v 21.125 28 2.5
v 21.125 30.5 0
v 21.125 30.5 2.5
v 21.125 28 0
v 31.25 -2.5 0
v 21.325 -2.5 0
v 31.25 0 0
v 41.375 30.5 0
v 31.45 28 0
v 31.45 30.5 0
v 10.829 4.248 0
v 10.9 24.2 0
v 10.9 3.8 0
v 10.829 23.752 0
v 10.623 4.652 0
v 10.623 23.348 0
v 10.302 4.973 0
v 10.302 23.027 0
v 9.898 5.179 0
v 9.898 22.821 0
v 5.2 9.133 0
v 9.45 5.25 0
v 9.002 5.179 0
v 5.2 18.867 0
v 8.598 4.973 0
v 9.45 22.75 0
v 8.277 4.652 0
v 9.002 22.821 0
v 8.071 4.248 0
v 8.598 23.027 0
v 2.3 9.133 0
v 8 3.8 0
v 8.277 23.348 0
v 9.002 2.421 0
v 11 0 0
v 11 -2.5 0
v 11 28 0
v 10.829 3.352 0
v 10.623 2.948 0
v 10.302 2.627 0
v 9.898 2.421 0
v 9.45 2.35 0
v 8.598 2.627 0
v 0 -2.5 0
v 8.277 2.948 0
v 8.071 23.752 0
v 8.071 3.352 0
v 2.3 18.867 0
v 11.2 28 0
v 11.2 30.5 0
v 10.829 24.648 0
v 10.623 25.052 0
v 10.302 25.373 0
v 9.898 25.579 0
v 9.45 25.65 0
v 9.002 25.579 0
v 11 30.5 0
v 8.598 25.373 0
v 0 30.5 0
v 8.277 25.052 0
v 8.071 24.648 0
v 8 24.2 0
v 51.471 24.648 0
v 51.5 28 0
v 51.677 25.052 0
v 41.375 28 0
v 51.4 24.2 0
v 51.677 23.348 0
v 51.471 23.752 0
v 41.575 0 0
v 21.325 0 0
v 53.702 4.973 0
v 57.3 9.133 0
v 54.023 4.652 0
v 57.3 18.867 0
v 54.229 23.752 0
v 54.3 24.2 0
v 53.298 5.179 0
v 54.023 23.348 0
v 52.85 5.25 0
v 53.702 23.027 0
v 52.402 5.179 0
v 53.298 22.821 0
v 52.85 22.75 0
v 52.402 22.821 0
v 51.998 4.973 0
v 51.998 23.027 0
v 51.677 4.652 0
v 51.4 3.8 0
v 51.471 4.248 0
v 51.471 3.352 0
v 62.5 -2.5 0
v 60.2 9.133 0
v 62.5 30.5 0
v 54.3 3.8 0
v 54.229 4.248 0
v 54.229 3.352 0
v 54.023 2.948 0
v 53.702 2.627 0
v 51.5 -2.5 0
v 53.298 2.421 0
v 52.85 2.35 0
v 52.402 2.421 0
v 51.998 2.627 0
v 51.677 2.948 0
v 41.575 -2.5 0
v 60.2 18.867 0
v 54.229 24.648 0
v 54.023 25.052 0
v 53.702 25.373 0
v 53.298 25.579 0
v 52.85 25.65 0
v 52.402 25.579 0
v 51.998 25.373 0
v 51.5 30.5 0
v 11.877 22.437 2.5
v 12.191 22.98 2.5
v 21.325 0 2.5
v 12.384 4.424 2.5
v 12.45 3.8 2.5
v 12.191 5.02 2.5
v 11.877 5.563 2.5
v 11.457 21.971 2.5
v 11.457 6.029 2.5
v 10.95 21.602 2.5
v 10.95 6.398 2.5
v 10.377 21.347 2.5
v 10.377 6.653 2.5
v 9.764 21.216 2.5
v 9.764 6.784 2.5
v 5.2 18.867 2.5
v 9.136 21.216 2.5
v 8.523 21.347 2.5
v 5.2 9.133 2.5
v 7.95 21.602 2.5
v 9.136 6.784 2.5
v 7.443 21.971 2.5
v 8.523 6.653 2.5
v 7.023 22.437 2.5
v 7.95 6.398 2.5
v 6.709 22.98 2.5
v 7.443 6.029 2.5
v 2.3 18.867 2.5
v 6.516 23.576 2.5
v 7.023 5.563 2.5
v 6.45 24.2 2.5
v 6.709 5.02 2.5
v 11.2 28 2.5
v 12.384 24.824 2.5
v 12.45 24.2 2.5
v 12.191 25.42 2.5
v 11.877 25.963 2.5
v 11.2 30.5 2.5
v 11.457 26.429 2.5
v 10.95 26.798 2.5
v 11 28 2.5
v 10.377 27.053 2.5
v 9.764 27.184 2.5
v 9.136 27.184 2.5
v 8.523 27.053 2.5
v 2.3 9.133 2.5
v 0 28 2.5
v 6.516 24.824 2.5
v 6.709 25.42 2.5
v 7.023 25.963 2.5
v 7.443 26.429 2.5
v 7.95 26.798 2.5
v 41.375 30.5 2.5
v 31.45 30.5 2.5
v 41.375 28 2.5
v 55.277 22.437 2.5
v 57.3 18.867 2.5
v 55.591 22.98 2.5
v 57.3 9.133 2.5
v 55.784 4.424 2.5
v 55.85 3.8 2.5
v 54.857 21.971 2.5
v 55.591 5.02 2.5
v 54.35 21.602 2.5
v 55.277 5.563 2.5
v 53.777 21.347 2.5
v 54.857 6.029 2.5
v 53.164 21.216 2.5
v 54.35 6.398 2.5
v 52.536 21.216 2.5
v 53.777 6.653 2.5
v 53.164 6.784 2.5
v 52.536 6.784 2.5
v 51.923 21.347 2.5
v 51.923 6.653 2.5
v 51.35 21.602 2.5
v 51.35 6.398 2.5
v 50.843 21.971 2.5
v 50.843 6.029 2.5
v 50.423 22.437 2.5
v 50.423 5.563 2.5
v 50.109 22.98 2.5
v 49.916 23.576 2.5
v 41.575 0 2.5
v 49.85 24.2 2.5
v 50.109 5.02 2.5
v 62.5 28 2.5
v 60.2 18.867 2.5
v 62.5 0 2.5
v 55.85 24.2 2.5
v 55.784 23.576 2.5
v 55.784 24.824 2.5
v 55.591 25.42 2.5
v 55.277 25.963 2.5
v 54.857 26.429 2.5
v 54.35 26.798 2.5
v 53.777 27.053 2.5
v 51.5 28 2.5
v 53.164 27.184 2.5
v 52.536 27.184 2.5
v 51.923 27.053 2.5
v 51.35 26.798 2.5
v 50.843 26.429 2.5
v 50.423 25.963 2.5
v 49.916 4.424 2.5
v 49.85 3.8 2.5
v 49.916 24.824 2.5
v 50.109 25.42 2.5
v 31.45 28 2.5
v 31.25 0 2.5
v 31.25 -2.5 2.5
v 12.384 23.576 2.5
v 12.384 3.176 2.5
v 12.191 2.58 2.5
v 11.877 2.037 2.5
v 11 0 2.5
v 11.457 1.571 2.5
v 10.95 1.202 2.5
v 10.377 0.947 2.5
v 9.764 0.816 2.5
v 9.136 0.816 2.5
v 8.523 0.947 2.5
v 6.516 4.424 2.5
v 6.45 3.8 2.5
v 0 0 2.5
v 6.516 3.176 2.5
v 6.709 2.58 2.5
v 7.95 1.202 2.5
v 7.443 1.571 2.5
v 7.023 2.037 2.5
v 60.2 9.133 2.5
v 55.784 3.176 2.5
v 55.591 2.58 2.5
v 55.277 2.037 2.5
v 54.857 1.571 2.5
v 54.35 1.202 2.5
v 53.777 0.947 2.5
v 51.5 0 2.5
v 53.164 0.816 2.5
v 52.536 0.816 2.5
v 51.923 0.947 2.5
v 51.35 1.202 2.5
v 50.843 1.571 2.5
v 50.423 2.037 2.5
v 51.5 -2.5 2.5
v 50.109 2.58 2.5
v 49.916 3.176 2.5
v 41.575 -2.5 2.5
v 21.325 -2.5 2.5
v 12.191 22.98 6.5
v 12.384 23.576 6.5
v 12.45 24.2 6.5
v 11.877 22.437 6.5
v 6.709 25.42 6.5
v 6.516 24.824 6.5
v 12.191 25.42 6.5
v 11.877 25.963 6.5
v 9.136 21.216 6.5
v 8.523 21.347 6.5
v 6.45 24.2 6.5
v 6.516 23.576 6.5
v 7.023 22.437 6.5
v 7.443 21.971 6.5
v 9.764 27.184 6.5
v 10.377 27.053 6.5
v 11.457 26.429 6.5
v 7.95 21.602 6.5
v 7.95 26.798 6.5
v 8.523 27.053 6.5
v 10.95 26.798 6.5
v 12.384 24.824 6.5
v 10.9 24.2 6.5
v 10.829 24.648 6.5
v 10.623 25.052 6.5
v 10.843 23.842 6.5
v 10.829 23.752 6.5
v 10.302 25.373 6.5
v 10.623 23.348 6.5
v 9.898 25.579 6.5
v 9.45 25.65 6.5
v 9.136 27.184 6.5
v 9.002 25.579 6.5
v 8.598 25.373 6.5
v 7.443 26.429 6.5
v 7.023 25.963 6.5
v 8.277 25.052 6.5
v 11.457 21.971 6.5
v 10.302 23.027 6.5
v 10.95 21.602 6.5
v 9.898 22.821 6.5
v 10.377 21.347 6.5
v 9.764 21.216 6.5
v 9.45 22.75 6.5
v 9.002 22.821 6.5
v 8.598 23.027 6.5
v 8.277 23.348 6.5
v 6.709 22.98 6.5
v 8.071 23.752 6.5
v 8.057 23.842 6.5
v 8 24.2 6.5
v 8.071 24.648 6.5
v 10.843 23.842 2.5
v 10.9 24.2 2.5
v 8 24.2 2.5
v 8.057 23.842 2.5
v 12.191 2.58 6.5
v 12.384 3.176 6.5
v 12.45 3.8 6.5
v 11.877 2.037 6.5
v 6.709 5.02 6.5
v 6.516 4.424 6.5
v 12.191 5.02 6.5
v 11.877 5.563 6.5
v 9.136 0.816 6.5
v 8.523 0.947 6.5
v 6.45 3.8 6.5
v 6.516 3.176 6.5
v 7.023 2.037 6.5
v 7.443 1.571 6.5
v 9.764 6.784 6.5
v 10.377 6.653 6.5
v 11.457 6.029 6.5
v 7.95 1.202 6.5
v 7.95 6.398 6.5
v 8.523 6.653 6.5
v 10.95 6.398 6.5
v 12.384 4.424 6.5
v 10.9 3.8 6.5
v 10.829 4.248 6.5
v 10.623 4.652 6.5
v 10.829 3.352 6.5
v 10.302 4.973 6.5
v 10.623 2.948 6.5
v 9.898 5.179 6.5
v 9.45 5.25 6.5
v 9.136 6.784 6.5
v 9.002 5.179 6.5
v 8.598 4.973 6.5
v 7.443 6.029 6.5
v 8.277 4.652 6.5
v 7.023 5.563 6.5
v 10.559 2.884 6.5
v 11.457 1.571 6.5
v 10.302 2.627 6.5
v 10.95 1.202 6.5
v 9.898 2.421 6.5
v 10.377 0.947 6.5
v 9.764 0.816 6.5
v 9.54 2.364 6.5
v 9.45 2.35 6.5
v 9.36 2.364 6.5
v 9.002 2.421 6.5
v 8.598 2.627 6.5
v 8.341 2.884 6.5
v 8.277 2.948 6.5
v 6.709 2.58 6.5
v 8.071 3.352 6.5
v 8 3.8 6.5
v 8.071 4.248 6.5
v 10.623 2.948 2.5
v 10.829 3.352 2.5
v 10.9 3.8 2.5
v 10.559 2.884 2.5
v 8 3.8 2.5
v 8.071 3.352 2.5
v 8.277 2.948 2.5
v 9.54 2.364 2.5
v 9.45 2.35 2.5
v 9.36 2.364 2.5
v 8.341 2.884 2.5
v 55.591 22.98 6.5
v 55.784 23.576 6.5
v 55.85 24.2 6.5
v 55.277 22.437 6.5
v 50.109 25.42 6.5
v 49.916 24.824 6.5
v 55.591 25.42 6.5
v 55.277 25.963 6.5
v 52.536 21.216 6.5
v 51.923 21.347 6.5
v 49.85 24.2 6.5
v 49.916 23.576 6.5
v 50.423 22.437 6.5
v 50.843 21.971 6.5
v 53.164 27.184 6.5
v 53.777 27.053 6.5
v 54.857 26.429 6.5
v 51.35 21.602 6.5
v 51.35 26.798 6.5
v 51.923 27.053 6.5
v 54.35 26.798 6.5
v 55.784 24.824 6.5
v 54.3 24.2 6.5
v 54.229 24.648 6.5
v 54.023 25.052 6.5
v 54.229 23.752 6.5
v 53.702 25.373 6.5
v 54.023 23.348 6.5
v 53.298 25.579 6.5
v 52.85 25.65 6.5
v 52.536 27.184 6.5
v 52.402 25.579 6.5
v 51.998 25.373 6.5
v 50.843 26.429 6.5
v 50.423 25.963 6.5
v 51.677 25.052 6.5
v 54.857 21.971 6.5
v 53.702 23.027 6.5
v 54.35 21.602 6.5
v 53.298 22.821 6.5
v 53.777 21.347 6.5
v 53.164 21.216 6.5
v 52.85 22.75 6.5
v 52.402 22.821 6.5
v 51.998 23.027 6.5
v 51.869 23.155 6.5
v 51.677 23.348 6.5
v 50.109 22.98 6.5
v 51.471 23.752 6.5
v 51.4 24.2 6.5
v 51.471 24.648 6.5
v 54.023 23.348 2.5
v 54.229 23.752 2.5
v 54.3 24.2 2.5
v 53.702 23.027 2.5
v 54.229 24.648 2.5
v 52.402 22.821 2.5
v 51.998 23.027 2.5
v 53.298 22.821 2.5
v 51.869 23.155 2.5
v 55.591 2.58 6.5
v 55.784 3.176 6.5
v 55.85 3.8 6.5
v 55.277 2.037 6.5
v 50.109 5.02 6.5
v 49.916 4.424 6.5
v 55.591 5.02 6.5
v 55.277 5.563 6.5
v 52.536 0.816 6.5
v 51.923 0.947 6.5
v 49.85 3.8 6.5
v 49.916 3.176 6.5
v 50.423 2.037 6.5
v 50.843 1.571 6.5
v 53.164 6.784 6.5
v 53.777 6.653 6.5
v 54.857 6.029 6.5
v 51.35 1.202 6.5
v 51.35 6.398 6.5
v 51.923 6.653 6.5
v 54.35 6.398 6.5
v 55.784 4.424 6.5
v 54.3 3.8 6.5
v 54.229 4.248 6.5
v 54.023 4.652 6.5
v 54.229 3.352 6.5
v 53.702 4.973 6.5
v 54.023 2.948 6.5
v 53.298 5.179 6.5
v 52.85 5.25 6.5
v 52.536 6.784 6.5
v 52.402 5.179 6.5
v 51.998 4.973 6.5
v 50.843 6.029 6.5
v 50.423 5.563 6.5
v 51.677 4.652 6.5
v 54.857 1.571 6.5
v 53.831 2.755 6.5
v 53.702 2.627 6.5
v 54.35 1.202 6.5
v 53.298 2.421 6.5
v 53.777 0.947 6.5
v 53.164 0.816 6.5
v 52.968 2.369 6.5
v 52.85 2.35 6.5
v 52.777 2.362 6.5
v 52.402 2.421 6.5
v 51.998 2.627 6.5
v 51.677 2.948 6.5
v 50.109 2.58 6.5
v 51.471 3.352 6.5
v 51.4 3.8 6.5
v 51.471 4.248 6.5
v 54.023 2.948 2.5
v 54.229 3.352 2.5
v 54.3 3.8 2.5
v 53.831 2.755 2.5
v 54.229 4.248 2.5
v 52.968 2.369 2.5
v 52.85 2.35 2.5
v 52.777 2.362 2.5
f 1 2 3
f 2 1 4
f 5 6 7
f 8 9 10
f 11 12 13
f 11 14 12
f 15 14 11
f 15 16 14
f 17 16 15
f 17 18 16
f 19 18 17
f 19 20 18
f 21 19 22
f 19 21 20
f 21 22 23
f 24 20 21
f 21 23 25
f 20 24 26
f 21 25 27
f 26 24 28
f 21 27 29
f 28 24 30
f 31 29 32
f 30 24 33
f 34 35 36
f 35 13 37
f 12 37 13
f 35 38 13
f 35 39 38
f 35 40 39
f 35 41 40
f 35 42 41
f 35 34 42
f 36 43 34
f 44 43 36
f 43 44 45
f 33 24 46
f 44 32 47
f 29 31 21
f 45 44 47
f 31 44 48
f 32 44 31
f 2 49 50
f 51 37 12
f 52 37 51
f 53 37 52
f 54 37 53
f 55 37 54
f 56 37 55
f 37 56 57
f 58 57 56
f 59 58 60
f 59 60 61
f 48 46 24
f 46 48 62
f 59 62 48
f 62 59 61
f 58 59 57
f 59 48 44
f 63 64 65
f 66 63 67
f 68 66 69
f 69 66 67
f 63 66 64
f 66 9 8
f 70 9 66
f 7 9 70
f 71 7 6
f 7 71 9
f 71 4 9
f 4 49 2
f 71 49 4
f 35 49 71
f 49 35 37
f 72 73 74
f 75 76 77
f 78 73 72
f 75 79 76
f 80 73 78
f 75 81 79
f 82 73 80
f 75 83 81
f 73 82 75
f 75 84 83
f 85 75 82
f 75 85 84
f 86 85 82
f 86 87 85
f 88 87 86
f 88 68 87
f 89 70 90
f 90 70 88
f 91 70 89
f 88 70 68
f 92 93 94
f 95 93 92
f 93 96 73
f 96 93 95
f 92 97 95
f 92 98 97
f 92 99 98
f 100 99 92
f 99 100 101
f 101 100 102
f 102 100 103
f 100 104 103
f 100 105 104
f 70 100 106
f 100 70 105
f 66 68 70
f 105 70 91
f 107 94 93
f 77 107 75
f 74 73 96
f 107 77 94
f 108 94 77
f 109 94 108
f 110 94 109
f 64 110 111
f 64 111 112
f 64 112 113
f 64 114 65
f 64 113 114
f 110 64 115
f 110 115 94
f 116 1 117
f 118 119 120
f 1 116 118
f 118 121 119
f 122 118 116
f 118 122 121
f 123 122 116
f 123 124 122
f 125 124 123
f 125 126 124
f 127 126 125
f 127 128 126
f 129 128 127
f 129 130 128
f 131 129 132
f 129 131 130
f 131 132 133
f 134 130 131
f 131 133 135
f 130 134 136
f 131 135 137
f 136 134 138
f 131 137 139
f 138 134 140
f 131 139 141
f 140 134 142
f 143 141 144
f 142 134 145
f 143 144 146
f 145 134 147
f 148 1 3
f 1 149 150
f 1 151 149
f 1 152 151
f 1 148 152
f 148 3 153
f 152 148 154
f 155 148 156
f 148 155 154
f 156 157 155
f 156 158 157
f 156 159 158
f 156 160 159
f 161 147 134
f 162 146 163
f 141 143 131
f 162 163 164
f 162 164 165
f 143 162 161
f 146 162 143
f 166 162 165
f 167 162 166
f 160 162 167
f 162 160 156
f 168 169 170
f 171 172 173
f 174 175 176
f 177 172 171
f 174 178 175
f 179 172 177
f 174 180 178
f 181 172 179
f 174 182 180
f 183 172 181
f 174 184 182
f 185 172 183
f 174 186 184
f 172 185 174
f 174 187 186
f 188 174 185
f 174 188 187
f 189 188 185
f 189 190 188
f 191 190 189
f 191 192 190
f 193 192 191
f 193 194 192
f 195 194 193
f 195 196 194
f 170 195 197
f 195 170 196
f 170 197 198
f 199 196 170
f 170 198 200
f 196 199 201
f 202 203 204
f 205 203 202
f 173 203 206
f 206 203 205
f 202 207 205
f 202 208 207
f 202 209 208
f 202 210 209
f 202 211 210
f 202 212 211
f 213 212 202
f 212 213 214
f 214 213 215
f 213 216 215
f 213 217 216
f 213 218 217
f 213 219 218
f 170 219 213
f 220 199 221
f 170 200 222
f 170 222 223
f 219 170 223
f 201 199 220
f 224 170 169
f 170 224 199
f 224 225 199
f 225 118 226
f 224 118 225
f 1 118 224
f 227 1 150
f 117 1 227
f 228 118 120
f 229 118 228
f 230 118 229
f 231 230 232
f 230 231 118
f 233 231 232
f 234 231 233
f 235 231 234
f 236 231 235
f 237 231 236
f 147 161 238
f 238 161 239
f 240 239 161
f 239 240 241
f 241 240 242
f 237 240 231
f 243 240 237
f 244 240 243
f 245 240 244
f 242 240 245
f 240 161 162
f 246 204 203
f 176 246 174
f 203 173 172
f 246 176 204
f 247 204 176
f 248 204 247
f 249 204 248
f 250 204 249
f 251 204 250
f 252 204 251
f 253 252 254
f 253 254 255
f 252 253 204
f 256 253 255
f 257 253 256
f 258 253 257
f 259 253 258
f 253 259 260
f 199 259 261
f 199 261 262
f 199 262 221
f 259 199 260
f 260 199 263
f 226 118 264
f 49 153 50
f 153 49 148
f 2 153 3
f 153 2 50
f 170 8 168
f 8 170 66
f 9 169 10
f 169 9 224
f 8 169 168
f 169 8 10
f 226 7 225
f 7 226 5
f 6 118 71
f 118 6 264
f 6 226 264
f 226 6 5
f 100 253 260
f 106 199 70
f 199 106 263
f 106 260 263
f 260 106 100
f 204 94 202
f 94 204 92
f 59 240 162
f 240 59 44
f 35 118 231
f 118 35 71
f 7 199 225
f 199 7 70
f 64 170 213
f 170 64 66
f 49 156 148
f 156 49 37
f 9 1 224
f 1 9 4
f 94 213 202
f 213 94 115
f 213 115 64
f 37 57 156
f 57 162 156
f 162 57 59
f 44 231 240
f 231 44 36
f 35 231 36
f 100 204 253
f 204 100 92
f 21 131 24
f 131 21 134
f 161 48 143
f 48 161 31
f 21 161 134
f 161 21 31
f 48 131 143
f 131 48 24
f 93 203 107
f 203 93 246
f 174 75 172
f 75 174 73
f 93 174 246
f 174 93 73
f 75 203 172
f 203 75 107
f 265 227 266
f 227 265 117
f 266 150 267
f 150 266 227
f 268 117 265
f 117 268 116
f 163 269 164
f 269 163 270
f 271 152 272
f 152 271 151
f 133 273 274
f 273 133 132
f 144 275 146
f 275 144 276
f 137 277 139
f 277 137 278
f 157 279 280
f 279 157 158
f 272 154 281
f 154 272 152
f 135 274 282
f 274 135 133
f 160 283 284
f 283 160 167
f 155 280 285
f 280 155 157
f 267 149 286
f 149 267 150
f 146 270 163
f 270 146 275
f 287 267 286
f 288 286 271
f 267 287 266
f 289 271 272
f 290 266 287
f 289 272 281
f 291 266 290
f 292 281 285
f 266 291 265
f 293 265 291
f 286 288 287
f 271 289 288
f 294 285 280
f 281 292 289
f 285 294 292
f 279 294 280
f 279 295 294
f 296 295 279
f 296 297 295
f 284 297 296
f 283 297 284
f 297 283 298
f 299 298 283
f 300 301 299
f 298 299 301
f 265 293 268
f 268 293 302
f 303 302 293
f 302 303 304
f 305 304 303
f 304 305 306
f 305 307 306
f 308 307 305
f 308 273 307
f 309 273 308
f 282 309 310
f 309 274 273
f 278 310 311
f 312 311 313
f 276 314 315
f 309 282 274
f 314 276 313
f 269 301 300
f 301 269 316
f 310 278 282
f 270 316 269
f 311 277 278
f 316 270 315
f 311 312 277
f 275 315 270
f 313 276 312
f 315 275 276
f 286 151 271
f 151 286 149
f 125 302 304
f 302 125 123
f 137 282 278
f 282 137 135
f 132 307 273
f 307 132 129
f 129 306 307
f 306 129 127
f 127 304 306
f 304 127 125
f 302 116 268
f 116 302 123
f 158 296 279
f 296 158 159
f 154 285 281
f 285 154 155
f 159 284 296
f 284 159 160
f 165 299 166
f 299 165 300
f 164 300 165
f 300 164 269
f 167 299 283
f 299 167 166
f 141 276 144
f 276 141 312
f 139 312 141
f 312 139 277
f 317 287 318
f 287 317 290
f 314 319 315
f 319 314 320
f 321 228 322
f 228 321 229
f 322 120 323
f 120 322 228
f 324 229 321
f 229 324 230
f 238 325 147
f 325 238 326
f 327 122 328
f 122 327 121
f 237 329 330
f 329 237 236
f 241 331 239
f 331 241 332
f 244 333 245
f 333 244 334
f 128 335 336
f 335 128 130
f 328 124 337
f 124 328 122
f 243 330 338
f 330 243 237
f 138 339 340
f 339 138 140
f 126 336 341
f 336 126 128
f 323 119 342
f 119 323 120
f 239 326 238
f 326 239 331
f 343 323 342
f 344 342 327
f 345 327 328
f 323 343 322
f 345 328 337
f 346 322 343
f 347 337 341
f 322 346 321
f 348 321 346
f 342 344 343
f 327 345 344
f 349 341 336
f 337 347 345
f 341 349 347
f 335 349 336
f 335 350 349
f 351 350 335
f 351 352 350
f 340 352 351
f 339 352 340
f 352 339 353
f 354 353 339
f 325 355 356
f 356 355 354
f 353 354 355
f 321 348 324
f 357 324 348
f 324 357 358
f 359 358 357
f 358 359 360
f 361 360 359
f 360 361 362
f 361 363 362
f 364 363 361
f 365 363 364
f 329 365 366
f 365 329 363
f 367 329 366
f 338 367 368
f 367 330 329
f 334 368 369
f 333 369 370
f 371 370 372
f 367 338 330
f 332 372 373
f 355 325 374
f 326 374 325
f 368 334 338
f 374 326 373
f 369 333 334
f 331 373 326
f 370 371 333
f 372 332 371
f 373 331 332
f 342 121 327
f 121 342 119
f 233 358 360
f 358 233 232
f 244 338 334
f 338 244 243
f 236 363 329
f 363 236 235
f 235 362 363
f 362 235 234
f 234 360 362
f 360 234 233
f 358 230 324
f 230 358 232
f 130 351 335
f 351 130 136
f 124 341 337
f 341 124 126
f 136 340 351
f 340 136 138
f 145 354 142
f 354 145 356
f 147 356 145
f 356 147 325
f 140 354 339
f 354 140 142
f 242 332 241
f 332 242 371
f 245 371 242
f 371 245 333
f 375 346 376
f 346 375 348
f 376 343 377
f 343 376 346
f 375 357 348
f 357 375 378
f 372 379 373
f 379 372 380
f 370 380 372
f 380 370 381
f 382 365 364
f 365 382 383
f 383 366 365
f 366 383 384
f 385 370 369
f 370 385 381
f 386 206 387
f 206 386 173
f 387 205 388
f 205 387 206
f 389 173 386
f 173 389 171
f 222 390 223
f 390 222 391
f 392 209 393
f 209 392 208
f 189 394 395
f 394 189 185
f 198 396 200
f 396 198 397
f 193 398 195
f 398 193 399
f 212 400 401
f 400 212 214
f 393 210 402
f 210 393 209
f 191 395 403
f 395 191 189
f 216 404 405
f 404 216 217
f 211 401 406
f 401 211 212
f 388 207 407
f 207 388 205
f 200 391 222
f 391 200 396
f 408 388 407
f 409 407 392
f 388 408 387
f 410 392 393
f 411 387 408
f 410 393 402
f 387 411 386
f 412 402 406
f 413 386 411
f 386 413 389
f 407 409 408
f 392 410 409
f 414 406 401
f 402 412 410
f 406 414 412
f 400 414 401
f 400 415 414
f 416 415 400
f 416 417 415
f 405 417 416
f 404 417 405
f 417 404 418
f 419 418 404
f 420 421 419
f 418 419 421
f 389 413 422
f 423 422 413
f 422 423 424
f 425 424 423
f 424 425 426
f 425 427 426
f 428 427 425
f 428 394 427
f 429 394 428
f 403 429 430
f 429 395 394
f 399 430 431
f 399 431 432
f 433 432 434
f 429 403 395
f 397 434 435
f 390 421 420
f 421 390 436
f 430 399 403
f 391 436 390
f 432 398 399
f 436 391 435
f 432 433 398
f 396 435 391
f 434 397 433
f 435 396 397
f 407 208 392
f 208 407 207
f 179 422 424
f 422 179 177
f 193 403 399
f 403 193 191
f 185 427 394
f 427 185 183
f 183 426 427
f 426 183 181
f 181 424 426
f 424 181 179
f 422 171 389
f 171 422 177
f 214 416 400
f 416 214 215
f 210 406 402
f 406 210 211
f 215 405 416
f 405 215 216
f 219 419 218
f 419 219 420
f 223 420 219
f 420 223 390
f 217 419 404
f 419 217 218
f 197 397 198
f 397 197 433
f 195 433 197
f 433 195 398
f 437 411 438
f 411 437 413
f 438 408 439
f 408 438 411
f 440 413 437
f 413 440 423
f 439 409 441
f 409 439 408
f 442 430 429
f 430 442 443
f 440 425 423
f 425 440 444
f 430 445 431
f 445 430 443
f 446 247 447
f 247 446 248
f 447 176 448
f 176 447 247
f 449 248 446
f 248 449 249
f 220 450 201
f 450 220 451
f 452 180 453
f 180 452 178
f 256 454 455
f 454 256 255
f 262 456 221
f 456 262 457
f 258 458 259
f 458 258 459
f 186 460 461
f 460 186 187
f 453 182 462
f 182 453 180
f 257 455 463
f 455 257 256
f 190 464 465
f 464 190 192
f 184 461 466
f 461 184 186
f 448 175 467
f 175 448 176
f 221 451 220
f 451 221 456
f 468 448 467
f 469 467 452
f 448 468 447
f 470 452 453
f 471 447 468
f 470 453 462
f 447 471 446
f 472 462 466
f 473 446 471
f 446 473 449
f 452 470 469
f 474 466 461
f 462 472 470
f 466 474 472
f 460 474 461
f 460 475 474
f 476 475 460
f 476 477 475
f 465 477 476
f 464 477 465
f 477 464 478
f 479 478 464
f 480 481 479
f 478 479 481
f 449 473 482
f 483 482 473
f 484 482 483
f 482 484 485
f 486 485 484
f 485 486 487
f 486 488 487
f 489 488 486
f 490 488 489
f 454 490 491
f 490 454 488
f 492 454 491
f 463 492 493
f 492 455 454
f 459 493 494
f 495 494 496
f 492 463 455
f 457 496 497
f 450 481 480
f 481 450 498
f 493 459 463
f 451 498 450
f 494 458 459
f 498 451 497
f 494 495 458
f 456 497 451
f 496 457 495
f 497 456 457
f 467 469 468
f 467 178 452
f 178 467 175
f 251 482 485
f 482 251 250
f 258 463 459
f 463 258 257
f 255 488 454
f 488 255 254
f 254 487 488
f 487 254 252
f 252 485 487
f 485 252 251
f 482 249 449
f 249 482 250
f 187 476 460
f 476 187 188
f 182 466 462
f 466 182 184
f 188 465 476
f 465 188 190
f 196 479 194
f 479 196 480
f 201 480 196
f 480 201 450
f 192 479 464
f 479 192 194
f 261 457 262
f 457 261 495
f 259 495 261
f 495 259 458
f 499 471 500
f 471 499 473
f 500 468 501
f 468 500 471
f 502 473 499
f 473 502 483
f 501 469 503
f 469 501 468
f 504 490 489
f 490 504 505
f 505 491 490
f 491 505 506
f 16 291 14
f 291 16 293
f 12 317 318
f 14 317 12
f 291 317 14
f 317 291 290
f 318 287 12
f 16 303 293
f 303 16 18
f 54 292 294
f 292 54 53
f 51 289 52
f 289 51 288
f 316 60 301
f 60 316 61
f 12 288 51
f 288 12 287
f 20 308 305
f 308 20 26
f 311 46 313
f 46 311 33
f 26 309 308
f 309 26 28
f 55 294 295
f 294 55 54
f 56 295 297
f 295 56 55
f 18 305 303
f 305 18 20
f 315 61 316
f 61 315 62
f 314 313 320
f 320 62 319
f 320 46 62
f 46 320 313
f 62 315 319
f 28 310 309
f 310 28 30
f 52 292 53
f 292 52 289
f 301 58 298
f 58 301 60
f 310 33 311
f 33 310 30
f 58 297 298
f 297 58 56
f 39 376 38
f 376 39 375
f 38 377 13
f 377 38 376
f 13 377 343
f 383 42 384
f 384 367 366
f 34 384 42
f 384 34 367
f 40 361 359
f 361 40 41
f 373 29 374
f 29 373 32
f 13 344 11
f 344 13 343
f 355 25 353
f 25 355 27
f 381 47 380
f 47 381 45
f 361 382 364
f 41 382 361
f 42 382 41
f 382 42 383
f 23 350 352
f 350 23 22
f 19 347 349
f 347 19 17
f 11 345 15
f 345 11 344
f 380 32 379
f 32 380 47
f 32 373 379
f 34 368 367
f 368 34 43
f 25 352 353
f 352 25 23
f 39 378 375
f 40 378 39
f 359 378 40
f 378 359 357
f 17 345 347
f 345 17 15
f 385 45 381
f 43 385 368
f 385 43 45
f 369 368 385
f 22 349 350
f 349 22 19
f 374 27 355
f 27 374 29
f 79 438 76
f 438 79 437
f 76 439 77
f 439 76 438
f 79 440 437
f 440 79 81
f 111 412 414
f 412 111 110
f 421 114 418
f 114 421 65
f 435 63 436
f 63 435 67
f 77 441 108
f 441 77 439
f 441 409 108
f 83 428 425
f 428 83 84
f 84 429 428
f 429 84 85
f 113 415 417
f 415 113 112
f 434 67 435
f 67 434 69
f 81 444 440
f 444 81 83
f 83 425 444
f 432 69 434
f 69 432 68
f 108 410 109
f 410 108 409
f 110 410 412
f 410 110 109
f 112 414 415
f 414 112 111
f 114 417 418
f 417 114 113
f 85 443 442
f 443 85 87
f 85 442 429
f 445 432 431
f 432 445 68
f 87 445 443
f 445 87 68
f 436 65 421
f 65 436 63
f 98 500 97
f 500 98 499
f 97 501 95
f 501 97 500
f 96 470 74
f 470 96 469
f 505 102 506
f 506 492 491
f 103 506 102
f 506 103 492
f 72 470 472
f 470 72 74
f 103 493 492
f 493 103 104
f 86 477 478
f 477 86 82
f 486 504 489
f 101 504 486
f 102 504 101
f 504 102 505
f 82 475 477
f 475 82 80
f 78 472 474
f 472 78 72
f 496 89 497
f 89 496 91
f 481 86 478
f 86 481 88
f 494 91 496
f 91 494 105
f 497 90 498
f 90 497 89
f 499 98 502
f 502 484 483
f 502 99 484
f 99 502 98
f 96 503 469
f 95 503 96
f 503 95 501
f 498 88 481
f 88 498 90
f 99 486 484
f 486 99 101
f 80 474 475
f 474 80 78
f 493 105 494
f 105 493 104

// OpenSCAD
/*
// dgazineu@gmail.com (Douglas Gazineu)
// Rev1: 2016-08-18 :: Initial Release
// Rev2: 2016-08-20 :: Removed Ring Shrinkage
// Rev3: 2016-08-22 :: Screw Holes option for Ring Lock, Internal Depth Correction
// Rev4: 2016-08-23 :: Internal support feet for boards, changed default walls orientation for printing it
// Rev5: 2016-08-24 :: Vents Option
// Rev6: 2016-12-02 :: Fix: Generate multiple parts at once
//
*/

// Part to be viewed
part = "bottom"; // [top:Top, bottom:Bottom, side:Sides, face: Front/Back, lock: Lock parts, all: Assembled View, exploded: Exploded View ]

/* [General Options] */
// Type of Lock
Lock_Type=2; //[1:Corners, 2:Rings]
// Reinforce Rings and provide screw hole
Ring_Screw_Holes = 1; //[0:No, 1:Yes]
// Internal Feet for boards 
Internal_Feet = 1; //[0:No, 1:Yes]
// Ventilation Openings 
Side_Vents = 1; //[0:No, 1:Yes]
Top_Vents = 1; //[0:No, 1:Yes]

/* [Dimensions] */
//Dimensions (Internal).
depth=55;
height=57;
width=28;
//Length of Lock parts/ring.
Lock_Length=11; // [3:50]
//Thickness of Walls
Wall_Thickness=2.5; // [2,2.5,3,3.5,4,4.5,5,5.5,6,7,8]
// Diameter of screw holes in mm
Ring_Screw_Diameter = 2.9; //[1.5,2,2.2,2.5,3,3.5,4,4.5,5]

/* [Internal Support Feet] */
// Internal Feet Separation (between center of holes)
Feet_Depth=43.4;
Feet_Width=20.4;
// Distances are cleared from walls on the reference side
Feet_Distance_From_Back = 0;
Feet_Distance_From_Side = .8;
Feet_Screw_Pole_Height = 4; //[1:10]
Feet_Screw_Pole_Diameter = 6; //[4:15]
Feet_Screw_Diameter = 2.9; //[1.5,2,2.2,2.5,3,3.5,4,4.5,5]

/* [Vents Options] */
Vents_Number=5;
Vents_Distance=1.5;
// Each vent length relative to width or height of panel
Vents_Relation=4; // [3:10]

/* [Fine Adjustments] */
// Avg Interval between anchor points for faces
Anchor_Interval=35; // [20,25,30,35,40,50,60,70,80,90,100]
// Gap between fittings, so no sanding should be needed
Gap=0.4;




module prism(l, w, h) {
       polyhedron(points=[
               [0,0,h],           // 0    front top corner
               [0,0,0],[w,0,0],   // 1, 2 front left & right bottom corners
               [0,l,h],           // 3    back top corner
               [0,l,0],[w,l,0]    // 4, 5 back left & right bottom corners
       ], faces=[ // points for all faces must be ordered clockwise when looking in
               [0,2,1],    // top face
               [3,4,5],    // base face
               [0,1,4,3],  // h face
               [1,2,5,4],  // w face
               [0,3,5,2],  // hypotenuse face
       ]);
}

module side(depth,width){
    Side_depth=depth+3*Wall_Thickness;
    Border_Distance= 2*Wall_Thickness+Ring_Screw_Diameter/2;
    Vent_Length = (width-2*Wall_Thickness)/Vents_Relation;
    difference(){
        plate(depth,width);
        if (Ring_Screw_Holes == 1) {
            if (Lock_Type==2){
                translate([Border_Distance,width/2,Wall_Thickness]) cylinder($fn= 20, h = 4*Wall_Thickness, r = Ring_Screw_Diameter/2, center=true);
               translate([Side_depth-Border_Distance,width/2,Wall_Thickness]) cylinder($fn= 20, h = 4*Wall_Thickness, r = Ring_Screw_Diameter/2, center=true);
                }
            }
           if (Side_Vents == 1){
               for (a=[0:1:Vents_Number-1]){
               translate([Lock_Length+(2*a*Vents_Distance)+Vents_Distance,Wall_Thickness,-Wall_Thickness]) cube([Vents_Distance,Vent_Length,3*Wall_Thickness]);
               translate([Lock_Length+(2*a*Vents_Distance)+Vents_Distance,width-Vent_Length-Wall_Thickness,-Wall_Thickness]) cube([Vents_Distance,Vent_Length,3*Wall_Thickness]);
               translate([depth-(Lock_Length+(2*(a+1)*Vents_Distance)-3*Wall_Thickness),Wall_Thickness,-Wall_Thickness]) cube([Vents_Distance,Vent_Length,3*Wall_Thickness]);
                 translate([depth-(Lock_Length+(2*(a+1)*Vents_Distance)-3*Wall_Thickness),width-Vent_Length-Wall_Thickness,-Wall_Thickness]) cube([Vents_Distance,Vent_Length,3*Wall_Thickness]);
               }
           }
        }
}

module bottom(depth,width){
    Bottom_depth=depth+3*Wall_Thickness;
    difference(){
        union(){
            plate(depth,width);
            if (Internal_Feet == 1){
                if (Lock_Type==2){
                    for (x =[Feet_Distance_From_Back:Feet_Depth:Feet_Distance_From_Back+Feet_Depth]){
                        for (y = [Feet_Distance_From_Side:Feet_Width:Feet_Distance_From_Side+Feet_Width]){
                            translate([x+Feet_Screw_Pole_Diameter/2,y+Feet_Screw_Pole_Diameter/2,0]) ScrewPost();
                        }
                    }
                }
            }
        }
        if (Internal_Feet == 1){
            if (Lock_Type==2){
                for (x =[Feet_Distance_From_Back:Feet_Depth:Feet_Distance_From_Back+Feet_Depth]){
                    for (y = [Feet_Distance_From_Side:Feet_Width:Feet_Distance_From_Side+Feet_Width]){
                        translate([x+Feet_Screw_Pole_Diameter/2,y+Feet_Screw_Pole_Diameter/2,0]) ScrewHole();
                        }
                    }
                }
            }
}

module top(depth,width){
    Top_depth=depth+3*Wall_Thickness;
    Vent_Length = (width-2*Wall_Thickness)/Vents_Relation;
    difference(){
        plate(depth,width);
        if (Top_Vents == 1){
                for (a=[0:1:Vents_Number-1]){
             translate([Lock_Length+(2*a*Vents_Distance)+Vents_Distance,Wall_Thickness,-Wall_Thickness]) cube([Vents_Distance,Vent_Length,3*Wall_Thickness]);
              translate([Lock_Length+(2*a*Vents_Distance)+Vents_Distance,width-Vent_Length-Wall_Thickness,-Wall_Thickness]) cube([Vents_Distance,Vent_Length,3*Wall_Thickness]);
               translate([depth-(Lock_Length+(2*(a+1)*Vents_Distance)-3*Wall_Thickness),Wall_Thickness,-Wall_Thickness]) cube([Vents_Distance,Vent_Length,3*Wall_Thickness]);
                 translate([depth-(Lock_Length+(2*(a+1)*Vents_Distance)-3*Wall_Thickness),width-Vent_Length-Wall_Thickness,-Wall_Thickness]) cube([Vents_Distance,Vent_Length,3*Wall_Thickness]);
               }
        }
    }
}

module ScrewPost(){
    Border_Distance= 2*Wall_Thickness+Ring_Screw_Diameter/2;
    difference(){
           translate([Border_Distance,0,-(Feet_Screw_Pole_Height/2)+Wall_Thickness/2]) cylinder($fn= 30, h=Feet_Screw_Pole_Height+Wall_Thickness, r = Feet_Screw_Pole_Diameter/2, center=true);   
        translate([Border_Distance,0,-Wall_Thickness]) cylinder($fn= 20, h=Wall_Thickness+Feet_Screw_Pole_Height+2, r = Feet_Screw_Diameter/2, center=true);
        
    }

}
module ScrewHole(){
    Border_Distance= 2*Wall_Thickness+Ring_Screw_Diameter/2;
    translate([Border_Distance,0,0]) cylinder($fn= 20, h=Wall_Thickness+Feet_Screw_Pole_Height+2, r = Feet_Screw_Diameter/2, center=true);
        
    }

}

module plate(depth,width) {
    depth=depth+3*Wall_Thickness;
    tmpcols = width % Anchor_Interval;
    cols=(width - tmpcols) / Anchor_Interval;
    sizecols = width / (cols+1.5);
   
    remain = depth - (2*Lock_Length);
    tmprows = remain % Anchor_Interval;
    rows=(remain - tmprows) / Anchor_Interval;
    sizerows = remain / (rows+1);
    
   difference(){
        union() {
          cube([depth, width, Wall_Thickness]);
          translate([depth,0,Wall_Thickness])     rotate([0,0,90])   prism(Lock_Length,-Wall_Thickness,-Wall_Thickness);
          translate([Lock_Length,0,Wall_Thickness])   rotate([0,0,90])    prism(Lock_Length,-Wall_Thickness,-Wall_Thickness);
      if (Lock_Type == 1){
              difference(){
                 union(){      
                      translate([depth,Wall_Thickness,Wall_Thickness]) rotate([0,0,90]) prism(Lock_Length,-2*Wall_Thickness,Wall_Thickness);     
                      translate([Lock_Length,Wall_Thickness,Wall_Thickness]) rotate([0,0,90]) prism(Lock_Length,-2*Wall_Thickness,Wall_Thickness);
                 }
                 translate([0,-Wall_Thickness,1.5*Wall_Thickness])  cube([depth, 2*Wall_Thickness, 0.5*Wall_Thickness]);
              }
       }
          translate([0,width,Wall_Thickness])  rotate([0,0,270]) prism(Lock_Length,-Wall_Thickness,-Wall_Thickness);
          translate([depth-Lock_Length,width,Wall_Thickness])  rotate([0,0,270]) prism(Lock_Length,-Wall_Thickness,-Wall_Thickness);
          union(){
             for (a =[0:sizerows:depth-(sizerows+(2*Lock_Length))]) {
              translate([a+Lock_Length+(Gap/2),-Wall_Thickness,0])
                   cube([(sizerows/2)-(Gap/2),2*Wall_Thickness,Wall_Thickness]);
              }
              for (a =[0:sizerows:depth-(sizerows+(2*Lock_Length))]) {
              translate([a+Lock_Length+(sizerows/2)+(Gap/2),-Wall_Thickness+width,0])
                   cube([(sizerows/2)-(Gap/2),2*Wall_Thickness,Wall_Thickness]);
              }
           }
      if (Lock_Type == 1){
         difference(){
                  union(){
                      translate([0,width-Wall_Thickness,Wall_Thickness]) rotate([0,0,270]) prism(Lock_Length,-2*Wall_Thickness,Wall_Thickness);
                      translate([depth-Lock_Length,width-Wall_Thickness,Wall_Thickness]) rotate([0,0,270]) prism(Lock_Length,-2*Wall_Thickness,Wall_Thickness);
                  }
                  translate([0,width-Wall_Thickness,1.5*Wall_Thickness]) cube ([depth, 2*Wall_Thickness, 0.5*Wall_Thickness]);
                  }
                  
            }
        }
        union(){
            for (a =[0:sizecols:width-sizecols]) {
              translate([Wall_Thickness-(Gap/2),(a+sizecols/2)-(Gap/2),-1])
                cube([Wall_Thickness+Gap,sizecols/2+Gap,2*Wall_Thickness]);
            }
            for (a =[0:sizecols:width-sizecols]) {
              translate([(depth-(2*Wall_Thickness))-(Gap/2),(a+sizecols/2)-(Gap/2),-1])
                cube([Wall_Thickness+Gap,sizecols/2+Gap,2*Wall_Thickness]);
            }
        }
    }
    
}

module corner(Wall_Thickness){
    length = Lock_Length;
    color("teal")
    difference(){
        difference(){
            rotate([0,0,45]) translate([-3*Wall_Thickness,-3*Wall_Thickness,0]) cube([5*Wall_Thickness,6*Wall_Thickness,length+1]);
            translate([0.9*Wall_Thickness,0.9*Wall_Thickness,1]) edge(length,Wall_Thickness);
        }
          union(){
            rotate([0,0,45])
            translate([-6*Wall_Thickness,-3*Wall_Thickness,-1]) cube([5.5*Wall_Thickness,5.5*Wall_Thickness,length+2+Wall_Thickness]);        
            translate([-2*Wall_Thickness,2.5*Wall_Thickness,-1]) rotate([0,0,180]) cube([6*Wall_Thickness,4*Wall_Thickness,length+2+Wall_Thickness]);
            translate([2.5*Wall_Thickness,-2*Wall_Thickness,-1]) rotate([0,0,180]) cube([6*Wall_Thickness,4*Wall_Thickness,length+2+Wall_Thickness]);  
            translate([-3*Wall_Thickness,2*Wall_Thickness,-1]) cube([6*Wall_Thickness,6*Wall_Thickness,length+2+Wall_Thickness]);
            translate([2*Wall_Thickness,-3*Wall_Thickness,-1]) cube([6*Wall_Thickness,6*Wall_Thickness,length+2+Wall_Thickness]);
             
         }
     }
}


module ring(height, width){
    Border_Distance= 2*Wall_Thickness+Ring_Screw_Diameter/2;
    
    color("teal")
    
    difference(){
        union(){
            translate([-Gap/2-1.5*Wall_Thickness,-Gap/2-1.5*Wall_Thickness,-1]) cube([height+Gap+3*Wall_Thickness, width+Gap+3*Wall_Thickness, Lock_Length+1]); // Ring Shell
            if (Ring_Screw_Holes == 1) {
                hull(){
                 translate([height/2,width/2,Border_Distance]) rotate([90,0,0]) cylinder($fn= 20, h = width+4*Wall_Thickness, r = 1.25*Ring_Screw_Diameter,center=true);
                translate([height/2,width/2,-0.5]) rotate([90,0,0]) cube([2.5*Ring_Screw_Diameter,1,width+4*Wall_Thickness],center=true);
                }
            }
        }
        union(){
            translate([-Gap/2-Wall_Thickness/2,-Gap/2-Wall_Thickness/2,-2]) cube([height+Gap+Wall_Thickness, width+Gap+Wall_Thickness, Lock_Length+3]); // Inner Hole
            translate([-Gap/2-Wall_Thickness,-Gap/2-Wall_Thickness,0]) cube([height+Gap+2*Wall_Thickness, width+Gap+2*Wall_Thickness, Lock_Length+2]); // Outer Hole
            if (Ring_Screw_Holes == 1) {
                 translate([height/2,width/2,Border_Distance]) rotate([90,0,0]) cylinder($fn= 20, h = width+6*Wall_Thickness, r = Ring_Screw_Diameter/2, center=true);
            }
        }
    }
    
}

module edge(length, Wall_Thickness){
    length = Lock_Length+Wall_Thickness;
    Wall_Thickness=Wall_Thickness+(Gap/2);
    translate([-Wall_Thickness,-Wall_Thickness,0])
    rotate([90,-90,90])
    difference(){
        union(){
          translate([0,-1.5*Wall_Thickness,-Wall_Thickness])    
          cube([length, Wall_Thickness*4, 2*Wall_Thickness]);    
      
          rotate([-90,0,180])
          translate([-length,-1.5*Wall_Thickness,-Wall_Thickness])    
          cube([length, Wall_Thickness*4, 2*Wall_Thickness]);  
     }
     rotate([45,0,0])
     translate([-1, -sqrt(2)*Wall_Thickness,sqrt(2)*Wall_Thickness])
     cube([length+2, Wall_Thickness*3, Wall_Thickness]);
  }
}


module face(height, width){
   tmprows = height % Anchor_Interval;
   rows=(height - tmprows) / Anchor_Interval;
   sizerows = height / (rows+1.5);
   tmpcols = width % Anchor_Interval;
   cols=(width - tmpcols) / Anchor_Interval;
   sizecols = width / (cols+1.5);
   color("white")
   union() {
     translate([Gap/2,Gap/2,0]) cube([height-Gap, width-Gap, Wall_Thickness]);
   
     translate([Gap/2,width-(Wall_Thickness/2)-Gap/2,0]) cube([height-Gap, Wall_Thickness/2,Wall_Thickness*1.5]);
     translate([Gap/2,Gap/2,0]) cube([height-Gap, Wall_Thickness/2,Wall_Thickness*1.5]);
     translate([Gap/2,Gap/2,0]) cube([Wall_Thickness/2, width-Gap,Wall_Thickness*1.5]);
     translate([height-(Wall_Thickness/2)-Gap/2,Gap/2,0]) cube([Wall_Thickness/2, width-Gap,Wall_Thickness*1.5]);
       
     for (a =[0:sizerows:height-sizerows]) {
         translate([a+sizerows/2,-Wall_Thickness,0])
            cube([sizerows/2,width+(Wall_Thickness*2),Wall_Thickness]);
      }
     for (a =[0:sizecols:width-sizecols]) {
         translate([-Wall_Thickness,a+sizecols/2,0])
            cube([height+(Wall_Thickness*2),sizecols/2,Wall_Thickness]);
      }
   }
}


module view(){
    if (part == "top"){
      // Top
        color ("gray")
        if (Lock_Type==2){
             rotate([180,0,0]) translate([0,-width,-Wall_Thickness]) top(depth,width);
        }
        else top(depth,width);
            
    }
    else if (part == "bottom"){
      // Bottom
        color ("gray")
        if (Lock_Type==2){
             rotate([180,0,0]) translate([0,-width,-Wall_Thickness]) bottom(depth,width);
        }
        else bottom(depth,width);
            
    }
    else if (part == "side"){
       // Sides
       color("silver") 
         if (Lock_Type==2){
             rotate([180,0,0]) translate([0,-height,-Wall_Thickness]) side(depth,height);
         }
         else side(depth,height);
    }
    else if (part == "lock"){
         if (Lock_Type == 1){
             // Corners
             corner (Wall_Thickness);
         } else{
             // Ring
             ring(height, width);
         }
    }
    
    else if (part == "face"){
       // Faces
       face(height, width);
    }
    else if (part == "all"){
      // Top
      color ("gray")
      translate([0,0,height+2*Wall_Thickness]) top(depth,width);
      // Bottom
      color ("gray")
      rotate([180,0,0]) translate([0,-width,-2*Wall_Thickness]) bottom(depth,width);
      // Left
      color ("silver")
       rotate([90,0,0]) translate([0,2*Wall_Thickness,0]) side(depth,height);
      // Right
        color ("silver")
       rotate([270,0,0]) translate([0,-2*Wall_Thickness-height,width]) side(depth,height);
       // Back Face
       rotate([0,270,0]) translate([2*Wall_Thickness,0,-2*Wall_Thickness]) face(height,width); 
       // Front Face
       rotate([0,270,180]) translate([2*Wall_Thickness,-width,depth+Wall_Thickness]) face(height,width);
       
       if (Lock_Type == 1){
           // Corners
           rotate([0,90,0]) translate([-2*Wall_Thickness,width,-1]) corner(Wall_Thickness);
           rotate([0,90,0]) translate([-2*Wall_Thickness,width,0]) rotate([0,0,90]) translate([0,height,-1]) corner(Wall_Thickness); 
           rotate([0,90,0]) translate([-2*Wall_Thickness,width,0]) rotate([0,0,-90]) translate([width,0,-1]) corner(Wall_Thickness); 
           rotate([0,90,0]) translate([-2*Wall_Thickness,width,0]) rotate([0,0,180]) translate([height,width,-1]) corner(Wall_Thickness);
            rotate([0,90,180]) translate([-2*Wall_Thickness,0,-depth-1-3*Wall_Thickness]) corner(Wall_Thickness);
           
           rotate([0,90,180]) translate([-2*Wall_Thickness,0,-depth-3*Wall_Thickness]) rotate([0,0,90]) translate([0,height,-1]) corner(Wall_Thickness);
           rotate([0,90,180]) translate([-2*Wall_Thickness,0,-depth-3*Wall_Thickness]) rotate([0,0,-90]) translate([width,0,-1]) corner(Wall_Thickness);
           rotate([0,90,180]) translate([-2*Wall_Thickness,0,-depth-3*Wall_Thickness]) rotate([0,0,180]) translate([height,width,-1]) corner(Wall_Thickness);
       }
       else{
           // Rings
           rotate([0,270,0]) translate([2*Wall_Thickness,0,-depth-3*Wall_Thickness]) ring(height, width);
           rotate([0,270,180]) translate([2*Wall_Thickness,-width,0]) ring(height, width);
       }
    }
    else{
      // Exploded Distance
      distance = 4*Wall_Thickness;
      // Top
      color ("gray")
      translate([0,distance,height+2*Wall_Thickness+2*distance]) top(depth,width);
      // Bottom
      color ("gray")
      rotate([180,0,0]) translate([0,-width-distance,-2*Wall_Thickness]) bottom(depth,width);
      // Left
      color ("silver")
       rotate([90,0,0]) translate([0,2*Wall_Thickness+distance,0]) side(depth,height);
      // Right
        color ("silver")
       rotate([270,0,0]) translate([0,-2*Wall_Thickness-height-distance,width+2*distance]) side(depth,height);
       // Back Face
       rotate([0,270,0]) translate([2*Wall_Thickness+distance,distance,-2*Wall_Thickness+distance]) face(height,width); 
       // Front Face
       rotate([0,270,180]) translate([2*Wall_Thickness+distance,-width-distance,depth-2*Wall_Thickness+distance+3*Wall_Thickness]) face(height,width);
       
       if (Lock_Type == 1){
           // Corners
           rotate([0,90,0]) translate([-2*Wall_Thickness,width+2*distance,-1-distance-Lock_Length-Wall_Thickness]) corner(Wall_Thickness);
           rotate([0,90,0]) translate([-2*Wall_Thickness-2*distance,width,0]) rotate([0,0,90]) translate([2*distance,height,-1-distance-Lock_Length-Wall_Thickness]) corner(Wall_Thickness); 
           rotate([0,90,0]) translate([-2*Wall_Thickness,width,0]) rotate([0,0,-90]) translate([width,0,-1-distance-Lock_Length-Wall_Thickness]) corner(Wall_Thickness); 
           rotate([0,90,0]) translate([-2*Wall_Thickness-2*distance,width,0]) rotate([0,0,180]) translate([height,width,-1-distance-Lock_Length-Wall_Thickness]) corner(Wall_Thickness);
           
           
            rotate([0,90,180]) translate([-2*Wall_Thickness,0,-depth-1-distance-Lock_Length-Wall_Thickness]) corner(Wall_Thickness);
           rotate([0,90,180]) translate([-2*Wall_Thickness,0,-depth]) rotate([0,0,90]) translate([0,height+2*distance,-1-distance-Lock_Length-Wall_Thickness]) corner(Wall_Thickness);
           rotate([0,90,180]) translate([-2*Wall_Thickness,0,-depth]) rotate([0,0,-90]) translate([width+2*distance,0,-1-distance-Lock_Length-Wall_Thickness]) corner(Wall_Thickness);
           rotate([0,90,180]) translate([-2*Wall_Thickness,0,-depth]) rotate([0,0,180]) translate([height+2*distance,width+2*distance,-1-distance-Lock_Length-Wall_Thickness]) corner(Wall_Thickness);
       }
       else{
           // Rings
           rotate([0,270,0]) translate([2*Wall_Thickness+distance,distance,-depth-distance-Lock_Length-Wall_Thickness-3*Wall_Thickness]) ring(height, width);
           rotate([0,270,180]) translate([2*Wall_Thickness+distance,-width-distance,-distance-Lock_Length-Wall_Thickness]) ring(height, width);
       }
    } 
}

view();
